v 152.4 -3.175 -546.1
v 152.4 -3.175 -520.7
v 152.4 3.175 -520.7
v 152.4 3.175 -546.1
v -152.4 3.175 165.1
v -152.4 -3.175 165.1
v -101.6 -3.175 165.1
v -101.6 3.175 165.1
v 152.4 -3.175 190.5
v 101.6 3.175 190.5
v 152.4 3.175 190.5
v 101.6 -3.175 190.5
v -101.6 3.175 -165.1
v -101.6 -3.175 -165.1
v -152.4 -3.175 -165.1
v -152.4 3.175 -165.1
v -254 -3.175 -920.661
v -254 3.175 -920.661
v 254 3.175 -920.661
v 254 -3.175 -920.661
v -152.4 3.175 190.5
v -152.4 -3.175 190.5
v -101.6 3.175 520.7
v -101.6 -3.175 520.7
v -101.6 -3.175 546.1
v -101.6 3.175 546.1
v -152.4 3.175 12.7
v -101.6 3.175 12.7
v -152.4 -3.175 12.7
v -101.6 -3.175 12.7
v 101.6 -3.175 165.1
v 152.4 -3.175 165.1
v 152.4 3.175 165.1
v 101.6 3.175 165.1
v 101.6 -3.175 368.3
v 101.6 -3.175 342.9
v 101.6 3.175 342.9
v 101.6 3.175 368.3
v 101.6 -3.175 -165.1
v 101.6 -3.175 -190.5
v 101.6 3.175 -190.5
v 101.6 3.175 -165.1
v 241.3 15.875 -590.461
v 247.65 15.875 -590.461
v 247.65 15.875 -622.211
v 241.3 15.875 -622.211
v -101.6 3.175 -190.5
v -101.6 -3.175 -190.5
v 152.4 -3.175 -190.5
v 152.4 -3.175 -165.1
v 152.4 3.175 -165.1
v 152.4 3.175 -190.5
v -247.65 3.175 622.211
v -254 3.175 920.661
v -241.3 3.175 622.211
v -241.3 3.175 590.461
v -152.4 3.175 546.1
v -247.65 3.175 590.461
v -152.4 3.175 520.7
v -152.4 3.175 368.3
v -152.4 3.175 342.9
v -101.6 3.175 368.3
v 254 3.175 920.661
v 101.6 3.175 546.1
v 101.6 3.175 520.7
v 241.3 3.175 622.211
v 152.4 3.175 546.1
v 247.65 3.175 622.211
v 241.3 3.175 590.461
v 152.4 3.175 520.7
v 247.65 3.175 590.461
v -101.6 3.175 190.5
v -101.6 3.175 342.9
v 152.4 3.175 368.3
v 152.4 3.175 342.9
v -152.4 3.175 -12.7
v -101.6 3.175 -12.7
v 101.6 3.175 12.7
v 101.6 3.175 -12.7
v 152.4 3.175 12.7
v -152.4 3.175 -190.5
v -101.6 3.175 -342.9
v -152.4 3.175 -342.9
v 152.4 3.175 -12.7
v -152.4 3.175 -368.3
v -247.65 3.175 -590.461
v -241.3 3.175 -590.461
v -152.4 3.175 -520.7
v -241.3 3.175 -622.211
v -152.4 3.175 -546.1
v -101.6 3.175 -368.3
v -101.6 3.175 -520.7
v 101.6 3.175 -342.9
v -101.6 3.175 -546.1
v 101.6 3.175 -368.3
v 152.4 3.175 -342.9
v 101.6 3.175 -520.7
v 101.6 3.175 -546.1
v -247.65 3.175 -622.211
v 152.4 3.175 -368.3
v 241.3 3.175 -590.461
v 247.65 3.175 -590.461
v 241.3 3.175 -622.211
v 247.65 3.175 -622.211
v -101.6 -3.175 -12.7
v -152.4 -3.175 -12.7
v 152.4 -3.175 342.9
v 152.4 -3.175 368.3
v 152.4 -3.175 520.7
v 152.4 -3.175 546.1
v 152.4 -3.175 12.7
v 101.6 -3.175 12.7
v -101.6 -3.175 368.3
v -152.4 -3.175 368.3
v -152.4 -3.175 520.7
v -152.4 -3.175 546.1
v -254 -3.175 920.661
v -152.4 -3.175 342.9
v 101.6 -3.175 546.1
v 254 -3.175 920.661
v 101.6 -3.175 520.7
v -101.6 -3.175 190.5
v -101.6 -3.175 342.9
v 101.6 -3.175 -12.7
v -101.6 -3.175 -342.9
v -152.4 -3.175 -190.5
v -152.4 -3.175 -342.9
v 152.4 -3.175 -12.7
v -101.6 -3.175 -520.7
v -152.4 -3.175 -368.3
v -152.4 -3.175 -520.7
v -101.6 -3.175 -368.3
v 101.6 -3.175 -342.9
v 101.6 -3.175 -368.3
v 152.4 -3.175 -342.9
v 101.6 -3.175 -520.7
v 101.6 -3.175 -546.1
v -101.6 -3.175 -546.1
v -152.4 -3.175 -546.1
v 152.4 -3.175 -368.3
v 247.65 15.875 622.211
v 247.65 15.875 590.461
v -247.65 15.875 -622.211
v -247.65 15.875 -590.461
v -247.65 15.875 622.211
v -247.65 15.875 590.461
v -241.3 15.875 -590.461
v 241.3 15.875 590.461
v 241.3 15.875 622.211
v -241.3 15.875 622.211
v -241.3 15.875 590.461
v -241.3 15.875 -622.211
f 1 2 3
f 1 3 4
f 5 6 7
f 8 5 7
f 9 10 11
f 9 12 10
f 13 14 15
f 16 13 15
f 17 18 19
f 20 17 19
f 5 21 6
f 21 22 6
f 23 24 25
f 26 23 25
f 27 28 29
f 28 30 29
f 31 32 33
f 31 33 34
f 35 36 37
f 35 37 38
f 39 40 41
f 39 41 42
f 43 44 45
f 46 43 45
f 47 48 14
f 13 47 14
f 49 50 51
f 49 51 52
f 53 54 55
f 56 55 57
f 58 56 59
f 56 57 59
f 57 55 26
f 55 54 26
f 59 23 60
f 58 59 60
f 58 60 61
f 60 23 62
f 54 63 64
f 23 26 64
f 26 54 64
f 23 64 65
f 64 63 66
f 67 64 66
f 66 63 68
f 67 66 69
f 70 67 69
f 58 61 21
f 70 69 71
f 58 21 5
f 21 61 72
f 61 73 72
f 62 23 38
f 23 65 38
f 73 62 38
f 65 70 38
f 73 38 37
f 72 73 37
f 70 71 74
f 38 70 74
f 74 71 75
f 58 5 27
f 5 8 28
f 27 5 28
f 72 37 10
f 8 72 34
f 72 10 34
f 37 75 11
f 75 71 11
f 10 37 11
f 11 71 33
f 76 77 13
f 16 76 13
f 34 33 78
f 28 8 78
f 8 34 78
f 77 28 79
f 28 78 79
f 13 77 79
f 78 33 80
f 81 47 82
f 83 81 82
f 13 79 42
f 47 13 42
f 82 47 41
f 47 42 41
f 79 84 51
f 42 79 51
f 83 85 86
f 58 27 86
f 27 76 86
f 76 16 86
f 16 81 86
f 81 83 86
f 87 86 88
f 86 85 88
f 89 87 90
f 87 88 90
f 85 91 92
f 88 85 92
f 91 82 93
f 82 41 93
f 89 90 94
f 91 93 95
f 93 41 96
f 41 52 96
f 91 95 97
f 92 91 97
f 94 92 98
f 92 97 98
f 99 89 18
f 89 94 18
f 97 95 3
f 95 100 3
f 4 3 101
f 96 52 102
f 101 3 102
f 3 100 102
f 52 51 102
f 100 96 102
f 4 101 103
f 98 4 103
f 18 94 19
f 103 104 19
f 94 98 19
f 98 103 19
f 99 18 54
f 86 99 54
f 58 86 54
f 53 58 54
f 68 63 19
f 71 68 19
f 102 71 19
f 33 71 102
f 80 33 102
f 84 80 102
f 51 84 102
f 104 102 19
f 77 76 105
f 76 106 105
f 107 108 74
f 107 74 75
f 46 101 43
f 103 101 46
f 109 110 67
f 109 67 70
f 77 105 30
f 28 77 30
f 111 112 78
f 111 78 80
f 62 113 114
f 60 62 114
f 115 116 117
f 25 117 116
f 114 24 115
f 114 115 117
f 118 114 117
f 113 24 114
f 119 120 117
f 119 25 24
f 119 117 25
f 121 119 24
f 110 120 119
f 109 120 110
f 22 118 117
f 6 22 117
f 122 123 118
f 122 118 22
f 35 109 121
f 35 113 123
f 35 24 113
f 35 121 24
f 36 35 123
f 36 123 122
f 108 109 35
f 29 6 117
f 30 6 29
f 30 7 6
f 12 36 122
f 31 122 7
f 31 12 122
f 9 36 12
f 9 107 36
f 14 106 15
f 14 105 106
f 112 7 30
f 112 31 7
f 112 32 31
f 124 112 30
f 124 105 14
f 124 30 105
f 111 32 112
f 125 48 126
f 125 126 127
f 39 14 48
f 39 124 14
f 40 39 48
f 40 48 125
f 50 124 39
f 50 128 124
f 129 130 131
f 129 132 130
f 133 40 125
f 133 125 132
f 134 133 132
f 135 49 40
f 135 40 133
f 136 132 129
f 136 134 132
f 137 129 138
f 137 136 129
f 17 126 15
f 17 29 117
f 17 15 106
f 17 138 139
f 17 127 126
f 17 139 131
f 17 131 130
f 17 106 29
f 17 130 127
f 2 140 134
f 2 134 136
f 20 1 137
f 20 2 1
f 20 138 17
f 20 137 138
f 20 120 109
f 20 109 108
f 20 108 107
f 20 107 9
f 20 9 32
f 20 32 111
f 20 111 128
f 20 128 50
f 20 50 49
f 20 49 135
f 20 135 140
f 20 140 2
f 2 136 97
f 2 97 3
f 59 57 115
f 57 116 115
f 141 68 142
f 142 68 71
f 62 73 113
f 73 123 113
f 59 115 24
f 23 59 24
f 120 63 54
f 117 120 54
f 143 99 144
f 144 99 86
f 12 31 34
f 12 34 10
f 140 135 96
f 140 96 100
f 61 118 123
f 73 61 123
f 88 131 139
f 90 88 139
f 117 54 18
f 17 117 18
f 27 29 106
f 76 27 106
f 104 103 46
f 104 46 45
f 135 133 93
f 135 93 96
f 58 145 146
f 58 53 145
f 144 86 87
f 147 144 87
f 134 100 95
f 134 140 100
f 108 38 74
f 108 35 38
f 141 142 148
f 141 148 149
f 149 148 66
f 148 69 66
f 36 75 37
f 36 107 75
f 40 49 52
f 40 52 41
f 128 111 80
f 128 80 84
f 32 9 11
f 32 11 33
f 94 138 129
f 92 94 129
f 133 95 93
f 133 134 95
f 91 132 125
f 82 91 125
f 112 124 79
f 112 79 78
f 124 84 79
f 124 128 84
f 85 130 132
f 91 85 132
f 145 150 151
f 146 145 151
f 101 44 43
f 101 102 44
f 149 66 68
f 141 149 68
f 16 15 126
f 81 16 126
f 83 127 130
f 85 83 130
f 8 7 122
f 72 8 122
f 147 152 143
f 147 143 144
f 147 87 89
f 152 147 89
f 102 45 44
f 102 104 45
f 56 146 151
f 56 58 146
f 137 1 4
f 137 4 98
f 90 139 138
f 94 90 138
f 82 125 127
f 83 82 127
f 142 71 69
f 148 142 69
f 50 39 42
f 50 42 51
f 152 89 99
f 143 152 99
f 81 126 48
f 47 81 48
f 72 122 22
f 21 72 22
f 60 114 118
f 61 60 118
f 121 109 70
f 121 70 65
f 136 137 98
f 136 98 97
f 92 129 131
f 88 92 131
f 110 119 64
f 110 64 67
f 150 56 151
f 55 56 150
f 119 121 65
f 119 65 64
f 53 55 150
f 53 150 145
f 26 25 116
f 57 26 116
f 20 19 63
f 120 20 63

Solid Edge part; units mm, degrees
sketch "Sketch1" plane through (0, 0, 0) normal (0, -1, 0) x (1, 0, 0)
  line L0 (-254, -920.6611) -> (254, -920.6611)
  line L1 (254, -920.6611) -> (254, 920.6611)
  line L2 (254, 920.6611) -> (-254, 920.6611)
  line L3 (-254, 920.6611) -> (-254, -920.6611)
extrude "Protrusion1" add sketch "Sketch1" along normal mid plane 6.35
sketch "Sketch2" plane through (0, 3.175, 0) normal (0, 1, 0) x (-1, 0, 0)
  line L0 (-241.3, 590.4611) -> (-241.3, 622.2111)
  line L1 (-241.3, 622.2111) -> (-247.65, 622.2111)
  line L2 (-247.65, 622.2111) -> (-247.65, 590.4611)
  line L3 (-247.65, 590.4611) -> (-241.3, 590.4611)
  line L4 (241.3, 590.4611) -> (241.3, 622.2111)
  line L5 (241.3, 622.2111) -> (247.65, 622.2111)
  line L6 (247.65, 622.2111) -> (247.65, 590.4611)
  line L7 (247.65, 590.4611) -> (241.3, 590.4611)
  line L8 (-241.3, -590.4611) -> (-241.3, -622.2111)
  line L9 (-241.3, -622.2111) -> (-247.65, -622.2111)
  line L10 (-247.65, -622.2111) -> (-247.65, -590.4611)
  line L11 (-247.65, -590.4611) -> (-241.3, -590.4611)
  line L12 (241.3, -590.4611) -> (241.3, -622.2111)
  line L13 (241.3, -622.2111) -> (247.65, -622.2111)
  line L14 (247.65, -622.2111) -> (247.65, -590.4611)
  line L15 (247.65, -590.4611) -> (241.3, -590.4611)
extrude "ExtrudedProtrusion_2" add sketch "Sketch2" along normal blind 12.7 and the other way blind 0.254
sketch "Sketch3" plane through (0, -3.175, 0) normal (0, -1, 0) x (1, 0, 0)
  line L0 (-152.4, -12.7) -> (-101.6, -12.7)
  line L1 (-101.6, -12.7) -> (-101.6, 12.7)
  line L2 (-101.6, 12.7) -> (-152.4, 12.7)
  line L3 (-152.4, 12.7) -> (-152.4, -12.7)
  line L4 (-152.4, -190.5) -> (-101.6, -190.5)
  line L5 (-101.6, -190.5) -> (-101.6, -165.1)
  line L6 (-101.6, -165.1) -> (-152.4, -165.1)
  line L7 (-152.4, -165.1) -> (-152.4, -190.5)
  line L8 (-152.4, -368.3) -> (-101.6, -368.3)
  line L9 (-101.6, -368.3) -> (-101.6, -342.9)
  line L10 (-101.6, -342.9) -> (-152.4, -342.9)
  line L11 (-152.4, -342.9) -> (-152.4, -368.3)
  line L12 (-152.4, -546.1) -> (-101.6, -546.1)
  line L13 (-101.6, -546.1) -> (-101.6, -520.7)
  line L14 (-101.6, -520.7) -> (-152.4, -520.7)
  line L15 (-152.4, -520.7) -> (-152.4, -546.1)
  line L16 (-152.4, 165.1) -> (-101.6, 165.1)
  line L17 (-101.6, 165.1) -> (-101.6, 190.5)
  line L18 (-101.6, 190.5) -> (-152.4, 190.5)
  line L19 (-152.4, 190.5) -> (-152.4, 165.1)
  line L20 (-152.4, 342.9) -> (-101.6, 342.9)
  line L21 (-101.6, 342.9) -> (-101.6, 368.3)
  line L22 (-101.6, 368.3) -> (-152.4, 368.3)
  line L23 (-152.4, 368.3) -> (-152.4, 342.9)
  line L24 (-152.4, 520.7) -> (-101.6, 520.7)
  line L25 (-101.6, 520.7) -> (-101.6, 546.1)
  line L26 (-101.6, 546.1) -> (-152.4, 546.1)
  line L27 (-152.4, 546.1) -> (-152.4, 520.7)
  line L28 (152.4, -12.7) -> (101.6, -12.7)
  line L29 (101.6, -12.7) -> (101.6, 12.7)
  line L30 (101.6, 12.7) -> (152.4, 12.7)
  line L31 (152.4, 12.7) -> (152.4, -12.7)
  line L32 (152.4, -190.5) -> (101.6, -190.5)
  line L33 (101.6, -190.5) -> (101.6, -165.1)
  line L34 (101.6, -165.1) -> (152.4, -165.1)
  line L35 (152.4, -165.1) -> (152.4, -190.5)
  line L36 (152.4, -368.3) -> (101.6, -368.3)
  line L37 (101.6, -368.3) -> (101.6, -342.9)
  line L38 (101.6, -342.9) -> (152.4, -342.9)
  line L39 (152.4, -342.9) -> (152.4, -368.3)
  line L40 (152.4, -546.1) -> (101.6, -546.1)
  line L41 (101.6, -546.1) -> (101.6, -520.7)
  line L42 (101.6, -520.7) -> (152.4, -520.7)
  line L43 (152.4, -520.7) -> (152.4, -546.1)
  line L44 (152.4, 165.1) -> (101.6, 165.1)
  line L45 (101.6, 165.1) -> (101.6, 190.5)
  line L46 (101.6, 190.5) -> (152.4, 190.5)
  line L47 (152.4, 190.5) -> (152.4, 165.1)
  line L48 (152.4, 342.9) -> (101.6, 342.9)
  line L49 (101.6, 342.9) -> (101.6, 368.3)
  line L50 (101.6, 368.3) -> (152.4, 368.3)
  line L51 (152.4, 368.3) -> (152.4, 342.9)
  line L52 (152.4, 520.7) -> (101.6, 520.7)
  line L53 (101.6, 520.7) -> (101.6, 546.1)
  line L54 (101.6, 546.1) -> (152.4, 546.1)
  line L55 (152.4, 546.1) -> (152.4, 520.7)
extrude "ExtrudedCutout_1" cut sketch "Sketch3" against normal blind 225.6874
